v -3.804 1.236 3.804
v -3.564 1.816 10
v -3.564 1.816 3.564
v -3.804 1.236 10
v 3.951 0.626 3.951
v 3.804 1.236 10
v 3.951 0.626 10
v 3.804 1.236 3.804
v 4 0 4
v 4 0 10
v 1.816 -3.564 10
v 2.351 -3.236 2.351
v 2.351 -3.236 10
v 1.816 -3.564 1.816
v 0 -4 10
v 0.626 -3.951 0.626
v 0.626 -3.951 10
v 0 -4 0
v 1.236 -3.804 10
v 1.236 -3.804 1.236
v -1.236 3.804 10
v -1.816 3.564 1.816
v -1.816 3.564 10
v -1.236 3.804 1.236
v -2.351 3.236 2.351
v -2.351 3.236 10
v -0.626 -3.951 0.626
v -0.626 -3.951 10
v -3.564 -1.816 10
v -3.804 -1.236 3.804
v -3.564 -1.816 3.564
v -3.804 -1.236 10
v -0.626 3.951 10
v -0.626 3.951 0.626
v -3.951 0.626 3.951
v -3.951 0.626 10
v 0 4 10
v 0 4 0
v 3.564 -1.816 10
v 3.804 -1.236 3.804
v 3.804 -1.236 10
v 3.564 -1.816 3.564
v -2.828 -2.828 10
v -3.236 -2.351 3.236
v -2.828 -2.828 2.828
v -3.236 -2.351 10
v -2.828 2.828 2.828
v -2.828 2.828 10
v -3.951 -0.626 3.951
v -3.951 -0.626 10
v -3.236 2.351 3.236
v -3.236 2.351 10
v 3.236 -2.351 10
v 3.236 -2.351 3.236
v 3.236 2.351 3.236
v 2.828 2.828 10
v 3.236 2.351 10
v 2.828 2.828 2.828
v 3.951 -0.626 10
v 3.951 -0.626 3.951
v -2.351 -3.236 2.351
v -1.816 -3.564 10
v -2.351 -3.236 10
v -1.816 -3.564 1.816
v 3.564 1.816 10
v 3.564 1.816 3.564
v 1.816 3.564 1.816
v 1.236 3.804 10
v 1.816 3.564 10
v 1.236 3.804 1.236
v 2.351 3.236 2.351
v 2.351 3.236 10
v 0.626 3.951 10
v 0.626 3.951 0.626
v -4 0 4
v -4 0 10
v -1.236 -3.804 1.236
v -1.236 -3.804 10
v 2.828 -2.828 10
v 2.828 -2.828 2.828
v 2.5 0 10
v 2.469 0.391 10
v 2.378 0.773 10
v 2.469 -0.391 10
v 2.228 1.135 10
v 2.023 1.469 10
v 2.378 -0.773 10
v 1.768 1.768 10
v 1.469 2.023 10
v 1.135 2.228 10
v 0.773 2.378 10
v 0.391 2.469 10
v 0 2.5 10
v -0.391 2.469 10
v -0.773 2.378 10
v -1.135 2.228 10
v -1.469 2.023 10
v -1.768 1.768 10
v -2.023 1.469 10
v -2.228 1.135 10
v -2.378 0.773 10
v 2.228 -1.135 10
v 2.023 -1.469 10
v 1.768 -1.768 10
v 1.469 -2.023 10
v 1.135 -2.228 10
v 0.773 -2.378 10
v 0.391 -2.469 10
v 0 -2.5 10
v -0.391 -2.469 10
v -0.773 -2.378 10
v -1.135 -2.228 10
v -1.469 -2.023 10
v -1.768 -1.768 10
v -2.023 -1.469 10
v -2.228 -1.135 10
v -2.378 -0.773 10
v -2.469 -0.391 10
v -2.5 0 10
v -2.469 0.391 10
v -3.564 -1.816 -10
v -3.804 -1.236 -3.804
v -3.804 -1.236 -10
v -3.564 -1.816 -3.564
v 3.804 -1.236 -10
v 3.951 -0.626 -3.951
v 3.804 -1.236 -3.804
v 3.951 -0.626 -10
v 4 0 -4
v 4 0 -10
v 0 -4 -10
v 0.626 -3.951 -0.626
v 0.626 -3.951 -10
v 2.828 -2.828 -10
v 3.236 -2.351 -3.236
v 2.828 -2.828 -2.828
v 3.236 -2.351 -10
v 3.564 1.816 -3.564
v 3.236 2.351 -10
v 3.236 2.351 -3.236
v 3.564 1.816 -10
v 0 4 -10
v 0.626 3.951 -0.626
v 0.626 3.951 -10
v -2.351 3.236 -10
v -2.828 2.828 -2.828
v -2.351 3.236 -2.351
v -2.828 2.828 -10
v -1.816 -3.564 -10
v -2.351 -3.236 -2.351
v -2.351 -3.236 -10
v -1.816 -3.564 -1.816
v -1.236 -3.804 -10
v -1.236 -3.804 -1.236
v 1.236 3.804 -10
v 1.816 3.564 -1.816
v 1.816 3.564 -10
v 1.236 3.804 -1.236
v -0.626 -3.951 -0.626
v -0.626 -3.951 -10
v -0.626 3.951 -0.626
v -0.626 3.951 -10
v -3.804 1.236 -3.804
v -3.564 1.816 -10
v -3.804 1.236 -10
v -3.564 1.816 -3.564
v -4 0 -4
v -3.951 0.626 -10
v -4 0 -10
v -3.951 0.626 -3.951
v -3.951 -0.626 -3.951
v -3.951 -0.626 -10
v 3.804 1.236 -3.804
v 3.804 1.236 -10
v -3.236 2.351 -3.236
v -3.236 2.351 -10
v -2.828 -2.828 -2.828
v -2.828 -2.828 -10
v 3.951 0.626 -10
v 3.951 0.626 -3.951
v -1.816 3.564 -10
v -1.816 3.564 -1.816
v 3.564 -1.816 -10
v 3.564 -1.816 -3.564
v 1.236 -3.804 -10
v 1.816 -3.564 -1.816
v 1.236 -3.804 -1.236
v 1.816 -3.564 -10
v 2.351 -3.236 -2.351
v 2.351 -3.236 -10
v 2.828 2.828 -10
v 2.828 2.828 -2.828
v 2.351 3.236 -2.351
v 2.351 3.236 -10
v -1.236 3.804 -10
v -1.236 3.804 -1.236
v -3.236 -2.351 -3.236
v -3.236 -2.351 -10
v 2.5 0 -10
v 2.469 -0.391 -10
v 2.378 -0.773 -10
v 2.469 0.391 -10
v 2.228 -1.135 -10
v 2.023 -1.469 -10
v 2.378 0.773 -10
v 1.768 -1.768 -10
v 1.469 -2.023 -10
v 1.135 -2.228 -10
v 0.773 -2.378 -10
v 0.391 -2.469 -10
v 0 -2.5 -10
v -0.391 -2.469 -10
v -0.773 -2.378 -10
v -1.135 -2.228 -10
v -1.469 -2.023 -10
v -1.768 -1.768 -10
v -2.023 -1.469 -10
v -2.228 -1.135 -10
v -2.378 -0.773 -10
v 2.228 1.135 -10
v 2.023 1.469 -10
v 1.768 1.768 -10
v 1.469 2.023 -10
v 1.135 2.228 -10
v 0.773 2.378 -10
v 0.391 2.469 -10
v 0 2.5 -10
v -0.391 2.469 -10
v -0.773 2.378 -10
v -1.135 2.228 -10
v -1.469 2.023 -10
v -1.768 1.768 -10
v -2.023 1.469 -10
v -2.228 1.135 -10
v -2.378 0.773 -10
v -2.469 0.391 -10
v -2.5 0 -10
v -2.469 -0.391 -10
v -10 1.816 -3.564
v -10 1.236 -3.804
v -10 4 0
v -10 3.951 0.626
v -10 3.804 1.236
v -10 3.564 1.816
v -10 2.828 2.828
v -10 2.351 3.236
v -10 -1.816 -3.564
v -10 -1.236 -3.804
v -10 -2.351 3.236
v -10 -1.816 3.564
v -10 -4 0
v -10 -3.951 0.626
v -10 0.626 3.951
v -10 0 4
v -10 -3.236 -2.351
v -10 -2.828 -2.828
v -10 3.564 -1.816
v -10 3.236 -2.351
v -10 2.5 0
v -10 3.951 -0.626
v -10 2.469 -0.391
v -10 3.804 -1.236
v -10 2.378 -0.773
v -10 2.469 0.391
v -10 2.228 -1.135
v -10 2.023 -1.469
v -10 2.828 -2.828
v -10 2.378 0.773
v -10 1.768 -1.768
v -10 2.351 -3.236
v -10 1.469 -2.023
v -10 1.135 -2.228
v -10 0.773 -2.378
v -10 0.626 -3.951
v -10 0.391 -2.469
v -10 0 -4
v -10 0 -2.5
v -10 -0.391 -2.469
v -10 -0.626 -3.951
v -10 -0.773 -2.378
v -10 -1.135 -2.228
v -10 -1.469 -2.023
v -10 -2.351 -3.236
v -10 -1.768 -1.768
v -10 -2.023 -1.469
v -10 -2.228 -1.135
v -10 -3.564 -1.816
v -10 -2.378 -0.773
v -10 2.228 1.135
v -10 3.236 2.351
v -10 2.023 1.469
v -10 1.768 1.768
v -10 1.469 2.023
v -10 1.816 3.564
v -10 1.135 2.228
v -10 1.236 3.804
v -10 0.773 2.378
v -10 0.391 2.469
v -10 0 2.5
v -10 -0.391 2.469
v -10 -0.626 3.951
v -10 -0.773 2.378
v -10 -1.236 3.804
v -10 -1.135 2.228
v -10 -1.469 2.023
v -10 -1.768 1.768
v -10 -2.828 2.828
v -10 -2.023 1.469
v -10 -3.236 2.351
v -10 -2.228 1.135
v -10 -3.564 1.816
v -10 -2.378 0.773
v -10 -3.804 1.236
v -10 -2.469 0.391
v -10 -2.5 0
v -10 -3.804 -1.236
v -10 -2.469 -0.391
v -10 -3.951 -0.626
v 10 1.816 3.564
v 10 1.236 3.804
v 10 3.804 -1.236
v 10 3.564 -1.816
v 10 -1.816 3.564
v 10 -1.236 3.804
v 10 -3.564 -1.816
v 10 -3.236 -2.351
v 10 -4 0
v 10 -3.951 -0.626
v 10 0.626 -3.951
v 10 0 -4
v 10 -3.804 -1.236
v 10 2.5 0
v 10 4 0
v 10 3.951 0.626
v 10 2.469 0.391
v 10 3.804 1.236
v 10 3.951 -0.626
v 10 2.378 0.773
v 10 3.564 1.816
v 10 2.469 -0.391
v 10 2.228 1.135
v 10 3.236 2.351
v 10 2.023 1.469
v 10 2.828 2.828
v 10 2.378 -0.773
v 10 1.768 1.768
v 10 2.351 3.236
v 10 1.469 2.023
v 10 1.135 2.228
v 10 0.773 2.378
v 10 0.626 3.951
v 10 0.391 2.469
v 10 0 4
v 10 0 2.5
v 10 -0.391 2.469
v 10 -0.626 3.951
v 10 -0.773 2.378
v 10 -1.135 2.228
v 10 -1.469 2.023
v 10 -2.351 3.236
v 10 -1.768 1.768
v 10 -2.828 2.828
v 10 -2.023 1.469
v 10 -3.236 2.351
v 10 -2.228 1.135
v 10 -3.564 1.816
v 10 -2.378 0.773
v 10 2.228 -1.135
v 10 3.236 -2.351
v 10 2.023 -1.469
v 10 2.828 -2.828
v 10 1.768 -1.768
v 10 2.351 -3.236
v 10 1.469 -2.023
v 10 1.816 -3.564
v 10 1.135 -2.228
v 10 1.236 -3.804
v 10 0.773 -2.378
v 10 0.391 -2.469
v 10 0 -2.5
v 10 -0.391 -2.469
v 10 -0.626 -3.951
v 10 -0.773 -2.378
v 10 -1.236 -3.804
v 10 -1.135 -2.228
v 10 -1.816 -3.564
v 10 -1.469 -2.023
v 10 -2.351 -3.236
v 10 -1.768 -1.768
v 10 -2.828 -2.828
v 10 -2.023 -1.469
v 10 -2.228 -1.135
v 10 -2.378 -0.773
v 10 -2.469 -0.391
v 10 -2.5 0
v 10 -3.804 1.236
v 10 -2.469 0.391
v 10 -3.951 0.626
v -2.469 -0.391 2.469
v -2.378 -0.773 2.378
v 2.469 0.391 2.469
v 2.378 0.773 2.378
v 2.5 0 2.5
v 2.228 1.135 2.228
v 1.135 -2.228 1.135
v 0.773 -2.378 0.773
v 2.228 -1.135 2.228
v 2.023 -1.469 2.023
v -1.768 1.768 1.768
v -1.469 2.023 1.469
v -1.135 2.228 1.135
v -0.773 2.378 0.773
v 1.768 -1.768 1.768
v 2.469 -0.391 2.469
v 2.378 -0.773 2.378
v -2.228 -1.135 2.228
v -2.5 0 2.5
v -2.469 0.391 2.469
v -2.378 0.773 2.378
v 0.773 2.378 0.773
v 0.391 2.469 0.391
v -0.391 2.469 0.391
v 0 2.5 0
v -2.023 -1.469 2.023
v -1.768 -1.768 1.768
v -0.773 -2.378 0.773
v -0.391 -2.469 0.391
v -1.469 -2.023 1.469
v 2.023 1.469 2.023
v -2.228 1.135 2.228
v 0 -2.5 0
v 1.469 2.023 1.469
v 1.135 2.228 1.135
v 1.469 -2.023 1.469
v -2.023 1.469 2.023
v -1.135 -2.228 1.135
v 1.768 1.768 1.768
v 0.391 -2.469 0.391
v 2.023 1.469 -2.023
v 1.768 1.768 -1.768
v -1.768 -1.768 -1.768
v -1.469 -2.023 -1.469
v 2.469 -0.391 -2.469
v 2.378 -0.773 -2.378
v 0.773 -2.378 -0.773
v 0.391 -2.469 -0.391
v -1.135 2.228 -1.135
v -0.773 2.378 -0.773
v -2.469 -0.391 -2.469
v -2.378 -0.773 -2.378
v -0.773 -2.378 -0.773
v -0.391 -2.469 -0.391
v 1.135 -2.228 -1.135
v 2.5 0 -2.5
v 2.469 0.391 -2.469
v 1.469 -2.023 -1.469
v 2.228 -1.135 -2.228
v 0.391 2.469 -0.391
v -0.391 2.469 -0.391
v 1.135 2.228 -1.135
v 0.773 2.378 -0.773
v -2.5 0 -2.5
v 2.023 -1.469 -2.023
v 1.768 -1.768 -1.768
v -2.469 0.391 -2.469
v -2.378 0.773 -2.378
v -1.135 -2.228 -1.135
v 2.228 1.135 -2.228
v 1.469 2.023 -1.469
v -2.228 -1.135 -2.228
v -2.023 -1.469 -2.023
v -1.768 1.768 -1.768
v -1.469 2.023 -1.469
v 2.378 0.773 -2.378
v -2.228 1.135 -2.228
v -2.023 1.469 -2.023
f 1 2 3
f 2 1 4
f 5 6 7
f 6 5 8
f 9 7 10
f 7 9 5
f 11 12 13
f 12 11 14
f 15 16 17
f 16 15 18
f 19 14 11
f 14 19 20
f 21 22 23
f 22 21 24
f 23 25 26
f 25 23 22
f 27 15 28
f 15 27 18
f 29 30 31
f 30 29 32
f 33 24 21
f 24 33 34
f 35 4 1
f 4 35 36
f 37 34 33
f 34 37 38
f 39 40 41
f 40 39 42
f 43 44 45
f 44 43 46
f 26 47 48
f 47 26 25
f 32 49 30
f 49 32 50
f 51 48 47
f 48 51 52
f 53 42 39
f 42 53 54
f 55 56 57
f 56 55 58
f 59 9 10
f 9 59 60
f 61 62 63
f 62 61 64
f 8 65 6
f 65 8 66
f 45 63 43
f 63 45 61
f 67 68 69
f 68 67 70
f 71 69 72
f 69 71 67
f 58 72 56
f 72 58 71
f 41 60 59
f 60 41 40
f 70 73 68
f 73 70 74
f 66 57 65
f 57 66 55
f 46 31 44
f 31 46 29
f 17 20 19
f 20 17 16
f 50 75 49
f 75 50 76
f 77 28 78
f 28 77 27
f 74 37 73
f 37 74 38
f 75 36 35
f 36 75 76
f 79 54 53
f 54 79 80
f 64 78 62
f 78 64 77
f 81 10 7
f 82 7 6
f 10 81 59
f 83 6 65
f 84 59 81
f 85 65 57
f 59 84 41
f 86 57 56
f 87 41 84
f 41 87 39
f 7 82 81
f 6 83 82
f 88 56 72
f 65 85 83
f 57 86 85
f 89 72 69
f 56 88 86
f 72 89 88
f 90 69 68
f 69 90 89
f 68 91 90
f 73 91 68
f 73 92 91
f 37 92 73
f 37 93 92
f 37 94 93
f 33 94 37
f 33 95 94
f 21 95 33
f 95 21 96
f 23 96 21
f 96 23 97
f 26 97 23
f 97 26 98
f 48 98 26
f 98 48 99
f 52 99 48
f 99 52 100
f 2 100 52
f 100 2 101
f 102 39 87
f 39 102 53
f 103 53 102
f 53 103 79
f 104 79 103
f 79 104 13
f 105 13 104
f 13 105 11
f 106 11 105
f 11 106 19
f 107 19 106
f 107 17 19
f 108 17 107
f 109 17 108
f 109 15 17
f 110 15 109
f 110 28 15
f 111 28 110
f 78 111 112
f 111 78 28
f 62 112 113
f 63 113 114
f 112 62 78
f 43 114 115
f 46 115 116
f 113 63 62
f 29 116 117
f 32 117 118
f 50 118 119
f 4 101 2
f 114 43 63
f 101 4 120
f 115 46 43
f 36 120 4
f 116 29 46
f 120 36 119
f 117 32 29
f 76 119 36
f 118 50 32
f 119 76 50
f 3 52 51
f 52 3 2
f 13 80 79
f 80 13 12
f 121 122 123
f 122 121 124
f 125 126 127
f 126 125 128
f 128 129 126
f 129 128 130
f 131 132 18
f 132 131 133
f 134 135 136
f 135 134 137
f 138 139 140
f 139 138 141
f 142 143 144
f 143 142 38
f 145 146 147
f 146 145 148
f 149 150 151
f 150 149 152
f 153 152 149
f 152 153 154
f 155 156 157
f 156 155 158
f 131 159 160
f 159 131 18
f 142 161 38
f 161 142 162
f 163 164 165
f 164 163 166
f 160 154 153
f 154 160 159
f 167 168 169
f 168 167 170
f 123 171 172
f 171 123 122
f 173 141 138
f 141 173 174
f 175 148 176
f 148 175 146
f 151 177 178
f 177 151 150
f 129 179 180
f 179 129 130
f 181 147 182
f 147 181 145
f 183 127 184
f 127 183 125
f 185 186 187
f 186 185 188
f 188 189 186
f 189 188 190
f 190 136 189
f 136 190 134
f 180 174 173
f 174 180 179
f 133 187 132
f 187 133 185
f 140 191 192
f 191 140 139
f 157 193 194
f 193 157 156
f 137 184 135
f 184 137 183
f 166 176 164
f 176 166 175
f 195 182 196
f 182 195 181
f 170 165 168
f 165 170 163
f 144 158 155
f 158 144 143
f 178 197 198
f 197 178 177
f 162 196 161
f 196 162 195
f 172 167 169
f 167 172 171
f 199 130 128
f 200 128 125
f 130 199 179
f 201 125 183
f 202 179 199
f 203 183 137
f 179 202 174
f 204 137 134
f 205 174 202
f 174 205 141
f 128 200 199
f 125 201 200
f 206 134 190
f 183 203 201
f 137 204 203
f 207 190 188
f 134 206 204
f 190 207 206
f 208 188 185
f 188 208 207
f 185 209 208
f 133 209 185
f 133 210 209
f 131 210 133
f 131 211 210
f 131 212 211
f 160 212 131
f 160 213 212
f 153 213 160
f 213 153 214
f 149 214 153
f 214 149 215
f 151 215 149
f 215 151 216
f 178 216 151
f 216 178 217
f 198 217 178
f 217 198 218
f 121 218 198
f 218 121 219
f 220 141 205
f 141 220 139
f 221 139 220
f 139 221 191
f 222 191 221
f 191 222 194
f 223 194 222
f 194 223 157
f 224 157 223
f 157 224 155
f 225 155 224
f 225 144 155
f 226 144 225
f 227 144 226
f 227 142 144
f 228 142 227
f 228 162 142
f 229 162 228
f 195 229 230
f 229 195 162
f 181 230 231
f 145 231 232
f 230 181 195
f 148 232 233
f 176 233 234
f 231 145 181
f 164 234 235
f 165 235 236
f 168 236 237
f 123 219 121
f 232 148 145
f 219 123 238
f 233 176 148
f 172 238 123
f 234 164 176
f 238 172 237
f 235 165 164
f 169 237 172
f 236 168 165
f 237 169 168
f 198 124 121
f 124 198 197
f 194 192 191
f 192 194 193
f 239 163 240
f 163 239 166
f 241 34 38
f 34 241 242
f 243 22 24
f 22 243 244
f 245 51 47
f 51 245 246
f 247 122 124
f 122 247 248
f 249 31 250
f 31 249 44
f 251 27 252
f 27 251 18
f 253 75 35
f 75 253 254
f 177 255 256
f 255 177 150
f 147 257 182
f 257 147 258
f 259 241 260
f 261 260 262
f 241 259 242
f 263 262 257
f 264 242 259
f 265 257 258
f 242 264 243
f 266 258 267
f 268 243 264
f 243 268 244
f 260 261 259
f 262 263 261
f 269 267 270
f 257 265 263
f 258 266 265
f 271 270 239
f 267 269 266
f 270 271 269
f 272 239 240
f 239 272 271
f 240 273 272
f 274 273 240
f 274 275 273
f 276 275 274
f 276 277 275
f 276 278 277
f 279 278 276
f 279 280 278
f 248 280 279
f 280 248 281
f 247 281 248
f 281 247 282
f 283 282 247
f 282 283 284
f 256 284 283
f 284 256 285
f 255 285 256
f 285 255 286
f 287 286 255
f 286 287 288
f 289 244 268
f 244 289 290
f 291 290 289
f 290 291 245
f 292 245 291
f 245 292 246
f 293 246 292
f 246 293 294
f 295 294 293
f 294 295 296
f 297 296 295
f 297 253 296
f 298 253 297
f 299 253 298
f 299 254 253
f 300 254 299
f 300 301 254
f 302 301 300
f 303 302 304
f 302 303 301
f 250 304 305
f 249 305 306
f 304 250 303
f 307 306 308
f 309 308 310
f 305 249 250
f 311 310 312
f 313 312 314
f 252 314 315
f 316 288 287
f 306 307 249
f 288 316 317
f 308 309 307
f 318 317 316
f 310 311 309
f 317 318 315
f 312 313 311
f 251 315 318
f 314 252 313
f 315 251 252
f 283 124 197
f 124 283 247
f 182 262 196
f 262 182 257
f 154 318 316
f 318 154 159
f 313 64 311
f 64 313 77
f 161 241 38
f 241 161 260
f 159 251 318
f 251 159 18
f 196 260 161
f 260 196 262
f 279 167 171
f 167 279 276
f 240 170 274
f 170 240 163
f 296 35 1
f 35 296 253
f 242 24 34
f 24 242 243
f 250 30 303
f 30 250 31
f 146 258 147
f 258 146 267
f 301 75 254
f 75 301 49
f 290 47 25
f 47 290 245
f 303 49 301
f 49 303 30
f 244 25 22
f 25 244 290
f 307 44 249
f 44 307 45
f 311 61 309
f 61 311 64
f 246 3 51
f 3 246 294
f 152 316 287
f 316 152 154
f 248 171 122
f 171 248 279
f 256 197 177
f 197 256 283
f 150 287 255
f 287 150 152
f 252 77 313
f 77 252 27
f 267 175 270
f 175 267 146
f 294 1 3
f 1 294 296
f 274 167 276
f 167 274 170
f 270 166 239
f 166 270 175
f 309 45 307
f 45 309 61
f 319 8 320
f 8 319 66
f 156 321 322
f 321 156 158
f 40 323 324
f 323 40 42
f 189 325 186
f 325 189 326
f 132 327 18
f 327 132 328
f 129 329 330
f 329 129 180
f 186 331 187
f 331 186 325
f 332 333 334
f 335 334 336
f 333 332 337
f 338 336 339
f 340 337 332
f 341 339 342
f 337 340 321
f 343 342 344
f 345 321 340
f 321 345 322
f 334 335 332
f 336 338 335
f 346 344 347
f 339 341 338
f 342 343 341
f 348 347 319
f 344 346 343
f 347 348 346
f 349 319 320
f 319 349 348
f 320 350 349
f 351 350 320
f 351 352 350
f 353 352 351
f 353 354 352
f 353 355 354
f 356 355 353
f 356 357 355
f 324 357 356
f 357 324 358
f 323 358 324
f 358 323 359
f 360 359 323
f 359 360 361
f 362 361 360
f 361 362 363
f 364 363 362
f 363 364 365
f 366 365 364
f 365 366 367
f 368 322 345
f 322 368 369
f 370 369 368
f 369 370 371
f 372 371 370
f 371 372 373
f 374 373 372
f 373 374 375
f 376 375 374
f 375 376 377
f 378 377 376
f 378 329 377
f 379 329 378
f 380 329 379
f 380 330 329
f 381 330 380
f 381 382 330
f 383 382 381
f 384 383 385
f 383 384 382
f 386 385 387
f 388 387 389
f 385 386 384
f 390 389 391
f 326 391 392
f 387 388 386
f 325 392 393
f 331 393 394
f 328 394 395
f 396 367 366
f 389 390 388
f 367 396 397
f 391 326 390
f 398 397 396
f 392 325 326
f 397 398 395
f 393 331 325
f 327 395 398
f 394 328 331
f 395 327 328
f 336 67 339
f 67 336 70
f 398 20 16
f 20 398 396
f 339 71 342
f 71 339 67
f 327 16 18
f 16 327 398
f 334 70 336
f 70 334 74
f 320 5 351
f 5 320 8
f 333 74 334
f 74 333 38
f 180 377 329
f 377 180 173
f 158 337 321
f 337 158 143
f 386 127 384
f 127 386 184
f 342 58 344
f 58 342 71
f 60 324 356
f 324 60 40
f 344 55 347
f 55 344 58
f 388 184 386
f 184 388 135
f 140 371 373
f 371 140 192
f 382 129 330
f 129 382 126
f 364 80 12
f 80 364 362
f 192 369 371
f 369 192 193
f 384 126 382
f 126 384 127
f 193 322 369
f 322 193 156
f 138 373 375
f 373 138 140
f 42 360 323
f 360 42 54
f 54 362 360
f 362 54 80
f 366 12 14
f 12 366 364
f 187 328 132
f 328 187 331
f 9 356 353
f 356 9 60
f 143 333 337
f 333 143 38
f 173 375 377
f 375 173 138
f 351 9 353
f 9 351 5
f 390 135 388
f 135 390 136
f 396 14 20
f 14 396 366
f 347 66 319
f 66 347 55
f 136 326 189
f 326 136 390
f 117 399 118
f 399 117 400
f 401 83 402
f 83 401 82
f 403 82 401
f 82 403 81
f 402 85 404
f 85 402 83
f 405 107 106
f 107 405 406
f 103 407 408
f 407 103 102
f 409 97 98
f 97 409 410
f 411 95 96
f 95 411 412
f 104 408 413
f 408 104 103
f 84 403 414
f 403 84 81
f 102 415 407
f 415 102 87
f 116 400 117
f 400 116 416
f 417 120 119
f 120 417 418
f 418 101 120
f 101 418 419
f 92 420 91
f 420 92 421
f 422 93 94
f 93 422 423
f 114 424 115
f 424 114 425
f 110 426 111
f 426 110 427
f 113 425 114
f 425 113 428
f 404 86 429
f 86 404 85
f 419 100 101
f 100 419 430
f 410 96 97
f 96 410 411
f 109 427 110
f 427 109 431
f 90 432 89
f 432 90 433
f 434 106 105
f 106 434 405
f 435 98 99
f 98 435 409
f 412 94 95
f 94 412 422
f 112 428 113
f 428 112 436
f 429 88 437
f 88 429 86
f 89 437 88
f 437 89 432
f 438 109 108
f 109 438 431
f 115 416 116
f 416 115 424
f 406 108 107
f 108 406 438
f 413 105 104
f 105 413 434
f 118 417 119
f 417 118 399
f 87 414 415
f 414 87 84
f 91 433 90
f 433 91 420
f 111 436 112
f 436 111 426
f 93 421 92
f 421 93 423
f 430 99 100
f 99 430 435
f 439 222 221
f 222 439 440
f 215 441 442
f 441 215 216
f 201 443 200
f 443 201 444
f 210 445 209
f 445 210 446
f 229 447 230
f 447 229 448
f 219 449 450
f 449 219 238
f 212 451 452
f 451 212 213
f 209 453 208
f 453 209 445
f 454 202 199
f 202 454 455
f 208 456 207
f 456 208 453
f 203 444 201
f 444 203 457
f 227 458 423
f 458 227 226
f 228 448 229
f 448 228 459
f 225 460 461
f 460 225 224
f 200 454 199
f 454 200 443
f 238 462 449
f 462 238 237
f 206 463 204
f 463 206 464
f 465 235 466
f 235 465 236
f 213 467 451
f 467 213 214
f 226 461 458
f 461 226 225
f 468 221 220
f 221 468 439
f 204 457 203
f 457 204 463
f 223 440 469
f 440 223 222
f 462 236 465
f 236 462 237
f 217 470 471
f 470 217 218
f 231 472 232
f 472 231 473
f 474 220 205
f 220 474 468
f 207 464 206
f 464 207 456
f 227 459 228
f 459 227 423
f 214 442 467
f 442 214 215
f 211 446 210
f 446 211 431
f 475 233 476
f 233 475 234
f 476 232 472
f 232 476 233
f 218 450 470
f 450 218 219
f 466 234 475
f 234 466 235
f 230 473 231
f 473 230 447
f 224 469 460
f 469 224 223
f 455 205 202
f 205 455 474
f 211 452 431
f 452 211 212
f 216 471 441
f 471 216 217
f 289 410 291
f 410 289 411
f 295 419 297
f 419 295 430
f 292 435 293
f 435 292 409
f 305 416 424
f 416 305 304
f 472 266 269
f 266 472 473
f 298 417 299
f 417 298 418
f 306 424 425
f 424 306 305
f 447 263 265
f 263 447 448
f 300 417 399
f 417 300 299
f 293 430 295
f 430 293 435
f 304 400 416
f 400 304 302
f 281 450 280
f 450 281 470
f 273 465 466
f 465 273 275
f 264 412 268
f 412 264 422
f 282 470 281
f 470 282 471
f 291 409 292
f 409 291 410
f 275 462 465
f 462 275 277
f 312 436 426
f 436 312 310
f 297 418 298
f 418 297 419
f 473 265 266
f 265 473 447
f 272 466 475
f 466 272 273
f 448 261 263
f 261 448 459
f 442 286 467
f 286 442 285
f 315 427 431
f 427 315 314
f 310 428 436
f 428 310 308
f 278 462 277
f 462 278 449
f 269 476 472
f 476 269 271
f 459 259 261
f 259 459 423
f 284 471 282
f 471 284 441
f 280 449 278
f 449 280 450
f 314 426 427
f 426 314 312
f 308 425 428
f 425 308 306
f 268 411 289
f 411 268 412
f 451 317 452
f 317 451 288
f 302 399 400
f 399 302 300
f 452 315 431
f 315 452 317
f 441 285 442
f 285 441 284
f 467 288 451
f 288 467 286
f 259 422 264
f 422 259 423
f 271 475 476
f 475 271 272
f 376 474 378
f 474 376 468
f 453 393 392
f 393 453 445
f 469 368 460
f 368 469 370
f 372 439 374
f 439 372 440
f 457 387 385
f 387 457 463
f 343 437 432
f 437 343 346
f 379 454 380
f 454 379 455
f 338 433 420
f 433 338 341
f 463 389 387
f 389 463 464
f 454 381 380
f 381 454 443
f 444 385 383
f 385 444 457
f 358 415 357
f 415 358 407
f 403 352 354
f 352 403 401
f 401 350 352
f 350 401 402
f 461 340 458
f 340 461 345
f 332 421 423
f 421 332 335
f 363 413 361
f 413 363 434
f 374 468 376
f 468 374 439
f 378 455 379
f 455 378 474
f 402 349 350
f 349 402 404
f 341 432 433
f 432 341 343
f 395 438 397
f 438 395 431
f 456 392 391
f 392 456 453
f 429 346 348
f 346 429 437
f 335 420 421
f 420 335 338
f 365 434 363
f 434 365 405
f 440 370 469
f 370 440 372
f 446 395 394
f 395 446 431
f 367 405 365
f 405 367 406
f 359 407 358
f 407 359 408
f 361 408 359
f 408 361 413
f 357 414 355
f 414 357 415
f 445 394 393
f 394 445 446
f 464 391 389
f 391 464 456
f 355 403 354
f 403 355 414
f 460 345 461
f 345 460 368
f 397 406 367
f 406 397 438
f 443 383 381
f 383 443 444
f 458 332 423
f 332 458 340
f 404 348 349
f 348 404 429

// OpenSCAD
center = [0, 0, 0]; // v[9]

neighbors = [ [0, 0, 1],
              [0, 0, -1],
              [-1, 0, 0],
              [1, 0, 0] ];

connector(center, neighbors);

module connector(center, neighbors)
{
    rod_diameter = 5;    // 3/16 inch = 4.7625mm
    conn_thick   = 3;
    conn_len     = 10;

    module rod(center, neighbor, diameter, extra_len) {
        n = neighbor - center; // normalize center at (0, 0, 0)
        length = sqrt(n*n);
        echo(length);
        theta = acos(n * [0, 0, 1] / sqrt(n*n));
        cross_prod = cross([0, 0, 1], n);
        axis = (cross_prod == [0, 0, 0] && theta == 180) ? [1, 0, 0] : cross_prod;
        rotate(theta, axis)
        translate(0, 0, 100)
        cylinder(h = conn_len + extra_len, d = diameter, center = false, $fn = 40);
    }

    difference() {
        union()
        {
            for (i = [0: len(neighbors)-1]) {
                rod(center, neighbors[i], rod_diameter+conn_thick, 0);
            }
        }
        for (i = [0: len(neighbors)-1]) {
            rod(center, neighbors[i], rod_diameter, 0.1);
        }
    }
}
